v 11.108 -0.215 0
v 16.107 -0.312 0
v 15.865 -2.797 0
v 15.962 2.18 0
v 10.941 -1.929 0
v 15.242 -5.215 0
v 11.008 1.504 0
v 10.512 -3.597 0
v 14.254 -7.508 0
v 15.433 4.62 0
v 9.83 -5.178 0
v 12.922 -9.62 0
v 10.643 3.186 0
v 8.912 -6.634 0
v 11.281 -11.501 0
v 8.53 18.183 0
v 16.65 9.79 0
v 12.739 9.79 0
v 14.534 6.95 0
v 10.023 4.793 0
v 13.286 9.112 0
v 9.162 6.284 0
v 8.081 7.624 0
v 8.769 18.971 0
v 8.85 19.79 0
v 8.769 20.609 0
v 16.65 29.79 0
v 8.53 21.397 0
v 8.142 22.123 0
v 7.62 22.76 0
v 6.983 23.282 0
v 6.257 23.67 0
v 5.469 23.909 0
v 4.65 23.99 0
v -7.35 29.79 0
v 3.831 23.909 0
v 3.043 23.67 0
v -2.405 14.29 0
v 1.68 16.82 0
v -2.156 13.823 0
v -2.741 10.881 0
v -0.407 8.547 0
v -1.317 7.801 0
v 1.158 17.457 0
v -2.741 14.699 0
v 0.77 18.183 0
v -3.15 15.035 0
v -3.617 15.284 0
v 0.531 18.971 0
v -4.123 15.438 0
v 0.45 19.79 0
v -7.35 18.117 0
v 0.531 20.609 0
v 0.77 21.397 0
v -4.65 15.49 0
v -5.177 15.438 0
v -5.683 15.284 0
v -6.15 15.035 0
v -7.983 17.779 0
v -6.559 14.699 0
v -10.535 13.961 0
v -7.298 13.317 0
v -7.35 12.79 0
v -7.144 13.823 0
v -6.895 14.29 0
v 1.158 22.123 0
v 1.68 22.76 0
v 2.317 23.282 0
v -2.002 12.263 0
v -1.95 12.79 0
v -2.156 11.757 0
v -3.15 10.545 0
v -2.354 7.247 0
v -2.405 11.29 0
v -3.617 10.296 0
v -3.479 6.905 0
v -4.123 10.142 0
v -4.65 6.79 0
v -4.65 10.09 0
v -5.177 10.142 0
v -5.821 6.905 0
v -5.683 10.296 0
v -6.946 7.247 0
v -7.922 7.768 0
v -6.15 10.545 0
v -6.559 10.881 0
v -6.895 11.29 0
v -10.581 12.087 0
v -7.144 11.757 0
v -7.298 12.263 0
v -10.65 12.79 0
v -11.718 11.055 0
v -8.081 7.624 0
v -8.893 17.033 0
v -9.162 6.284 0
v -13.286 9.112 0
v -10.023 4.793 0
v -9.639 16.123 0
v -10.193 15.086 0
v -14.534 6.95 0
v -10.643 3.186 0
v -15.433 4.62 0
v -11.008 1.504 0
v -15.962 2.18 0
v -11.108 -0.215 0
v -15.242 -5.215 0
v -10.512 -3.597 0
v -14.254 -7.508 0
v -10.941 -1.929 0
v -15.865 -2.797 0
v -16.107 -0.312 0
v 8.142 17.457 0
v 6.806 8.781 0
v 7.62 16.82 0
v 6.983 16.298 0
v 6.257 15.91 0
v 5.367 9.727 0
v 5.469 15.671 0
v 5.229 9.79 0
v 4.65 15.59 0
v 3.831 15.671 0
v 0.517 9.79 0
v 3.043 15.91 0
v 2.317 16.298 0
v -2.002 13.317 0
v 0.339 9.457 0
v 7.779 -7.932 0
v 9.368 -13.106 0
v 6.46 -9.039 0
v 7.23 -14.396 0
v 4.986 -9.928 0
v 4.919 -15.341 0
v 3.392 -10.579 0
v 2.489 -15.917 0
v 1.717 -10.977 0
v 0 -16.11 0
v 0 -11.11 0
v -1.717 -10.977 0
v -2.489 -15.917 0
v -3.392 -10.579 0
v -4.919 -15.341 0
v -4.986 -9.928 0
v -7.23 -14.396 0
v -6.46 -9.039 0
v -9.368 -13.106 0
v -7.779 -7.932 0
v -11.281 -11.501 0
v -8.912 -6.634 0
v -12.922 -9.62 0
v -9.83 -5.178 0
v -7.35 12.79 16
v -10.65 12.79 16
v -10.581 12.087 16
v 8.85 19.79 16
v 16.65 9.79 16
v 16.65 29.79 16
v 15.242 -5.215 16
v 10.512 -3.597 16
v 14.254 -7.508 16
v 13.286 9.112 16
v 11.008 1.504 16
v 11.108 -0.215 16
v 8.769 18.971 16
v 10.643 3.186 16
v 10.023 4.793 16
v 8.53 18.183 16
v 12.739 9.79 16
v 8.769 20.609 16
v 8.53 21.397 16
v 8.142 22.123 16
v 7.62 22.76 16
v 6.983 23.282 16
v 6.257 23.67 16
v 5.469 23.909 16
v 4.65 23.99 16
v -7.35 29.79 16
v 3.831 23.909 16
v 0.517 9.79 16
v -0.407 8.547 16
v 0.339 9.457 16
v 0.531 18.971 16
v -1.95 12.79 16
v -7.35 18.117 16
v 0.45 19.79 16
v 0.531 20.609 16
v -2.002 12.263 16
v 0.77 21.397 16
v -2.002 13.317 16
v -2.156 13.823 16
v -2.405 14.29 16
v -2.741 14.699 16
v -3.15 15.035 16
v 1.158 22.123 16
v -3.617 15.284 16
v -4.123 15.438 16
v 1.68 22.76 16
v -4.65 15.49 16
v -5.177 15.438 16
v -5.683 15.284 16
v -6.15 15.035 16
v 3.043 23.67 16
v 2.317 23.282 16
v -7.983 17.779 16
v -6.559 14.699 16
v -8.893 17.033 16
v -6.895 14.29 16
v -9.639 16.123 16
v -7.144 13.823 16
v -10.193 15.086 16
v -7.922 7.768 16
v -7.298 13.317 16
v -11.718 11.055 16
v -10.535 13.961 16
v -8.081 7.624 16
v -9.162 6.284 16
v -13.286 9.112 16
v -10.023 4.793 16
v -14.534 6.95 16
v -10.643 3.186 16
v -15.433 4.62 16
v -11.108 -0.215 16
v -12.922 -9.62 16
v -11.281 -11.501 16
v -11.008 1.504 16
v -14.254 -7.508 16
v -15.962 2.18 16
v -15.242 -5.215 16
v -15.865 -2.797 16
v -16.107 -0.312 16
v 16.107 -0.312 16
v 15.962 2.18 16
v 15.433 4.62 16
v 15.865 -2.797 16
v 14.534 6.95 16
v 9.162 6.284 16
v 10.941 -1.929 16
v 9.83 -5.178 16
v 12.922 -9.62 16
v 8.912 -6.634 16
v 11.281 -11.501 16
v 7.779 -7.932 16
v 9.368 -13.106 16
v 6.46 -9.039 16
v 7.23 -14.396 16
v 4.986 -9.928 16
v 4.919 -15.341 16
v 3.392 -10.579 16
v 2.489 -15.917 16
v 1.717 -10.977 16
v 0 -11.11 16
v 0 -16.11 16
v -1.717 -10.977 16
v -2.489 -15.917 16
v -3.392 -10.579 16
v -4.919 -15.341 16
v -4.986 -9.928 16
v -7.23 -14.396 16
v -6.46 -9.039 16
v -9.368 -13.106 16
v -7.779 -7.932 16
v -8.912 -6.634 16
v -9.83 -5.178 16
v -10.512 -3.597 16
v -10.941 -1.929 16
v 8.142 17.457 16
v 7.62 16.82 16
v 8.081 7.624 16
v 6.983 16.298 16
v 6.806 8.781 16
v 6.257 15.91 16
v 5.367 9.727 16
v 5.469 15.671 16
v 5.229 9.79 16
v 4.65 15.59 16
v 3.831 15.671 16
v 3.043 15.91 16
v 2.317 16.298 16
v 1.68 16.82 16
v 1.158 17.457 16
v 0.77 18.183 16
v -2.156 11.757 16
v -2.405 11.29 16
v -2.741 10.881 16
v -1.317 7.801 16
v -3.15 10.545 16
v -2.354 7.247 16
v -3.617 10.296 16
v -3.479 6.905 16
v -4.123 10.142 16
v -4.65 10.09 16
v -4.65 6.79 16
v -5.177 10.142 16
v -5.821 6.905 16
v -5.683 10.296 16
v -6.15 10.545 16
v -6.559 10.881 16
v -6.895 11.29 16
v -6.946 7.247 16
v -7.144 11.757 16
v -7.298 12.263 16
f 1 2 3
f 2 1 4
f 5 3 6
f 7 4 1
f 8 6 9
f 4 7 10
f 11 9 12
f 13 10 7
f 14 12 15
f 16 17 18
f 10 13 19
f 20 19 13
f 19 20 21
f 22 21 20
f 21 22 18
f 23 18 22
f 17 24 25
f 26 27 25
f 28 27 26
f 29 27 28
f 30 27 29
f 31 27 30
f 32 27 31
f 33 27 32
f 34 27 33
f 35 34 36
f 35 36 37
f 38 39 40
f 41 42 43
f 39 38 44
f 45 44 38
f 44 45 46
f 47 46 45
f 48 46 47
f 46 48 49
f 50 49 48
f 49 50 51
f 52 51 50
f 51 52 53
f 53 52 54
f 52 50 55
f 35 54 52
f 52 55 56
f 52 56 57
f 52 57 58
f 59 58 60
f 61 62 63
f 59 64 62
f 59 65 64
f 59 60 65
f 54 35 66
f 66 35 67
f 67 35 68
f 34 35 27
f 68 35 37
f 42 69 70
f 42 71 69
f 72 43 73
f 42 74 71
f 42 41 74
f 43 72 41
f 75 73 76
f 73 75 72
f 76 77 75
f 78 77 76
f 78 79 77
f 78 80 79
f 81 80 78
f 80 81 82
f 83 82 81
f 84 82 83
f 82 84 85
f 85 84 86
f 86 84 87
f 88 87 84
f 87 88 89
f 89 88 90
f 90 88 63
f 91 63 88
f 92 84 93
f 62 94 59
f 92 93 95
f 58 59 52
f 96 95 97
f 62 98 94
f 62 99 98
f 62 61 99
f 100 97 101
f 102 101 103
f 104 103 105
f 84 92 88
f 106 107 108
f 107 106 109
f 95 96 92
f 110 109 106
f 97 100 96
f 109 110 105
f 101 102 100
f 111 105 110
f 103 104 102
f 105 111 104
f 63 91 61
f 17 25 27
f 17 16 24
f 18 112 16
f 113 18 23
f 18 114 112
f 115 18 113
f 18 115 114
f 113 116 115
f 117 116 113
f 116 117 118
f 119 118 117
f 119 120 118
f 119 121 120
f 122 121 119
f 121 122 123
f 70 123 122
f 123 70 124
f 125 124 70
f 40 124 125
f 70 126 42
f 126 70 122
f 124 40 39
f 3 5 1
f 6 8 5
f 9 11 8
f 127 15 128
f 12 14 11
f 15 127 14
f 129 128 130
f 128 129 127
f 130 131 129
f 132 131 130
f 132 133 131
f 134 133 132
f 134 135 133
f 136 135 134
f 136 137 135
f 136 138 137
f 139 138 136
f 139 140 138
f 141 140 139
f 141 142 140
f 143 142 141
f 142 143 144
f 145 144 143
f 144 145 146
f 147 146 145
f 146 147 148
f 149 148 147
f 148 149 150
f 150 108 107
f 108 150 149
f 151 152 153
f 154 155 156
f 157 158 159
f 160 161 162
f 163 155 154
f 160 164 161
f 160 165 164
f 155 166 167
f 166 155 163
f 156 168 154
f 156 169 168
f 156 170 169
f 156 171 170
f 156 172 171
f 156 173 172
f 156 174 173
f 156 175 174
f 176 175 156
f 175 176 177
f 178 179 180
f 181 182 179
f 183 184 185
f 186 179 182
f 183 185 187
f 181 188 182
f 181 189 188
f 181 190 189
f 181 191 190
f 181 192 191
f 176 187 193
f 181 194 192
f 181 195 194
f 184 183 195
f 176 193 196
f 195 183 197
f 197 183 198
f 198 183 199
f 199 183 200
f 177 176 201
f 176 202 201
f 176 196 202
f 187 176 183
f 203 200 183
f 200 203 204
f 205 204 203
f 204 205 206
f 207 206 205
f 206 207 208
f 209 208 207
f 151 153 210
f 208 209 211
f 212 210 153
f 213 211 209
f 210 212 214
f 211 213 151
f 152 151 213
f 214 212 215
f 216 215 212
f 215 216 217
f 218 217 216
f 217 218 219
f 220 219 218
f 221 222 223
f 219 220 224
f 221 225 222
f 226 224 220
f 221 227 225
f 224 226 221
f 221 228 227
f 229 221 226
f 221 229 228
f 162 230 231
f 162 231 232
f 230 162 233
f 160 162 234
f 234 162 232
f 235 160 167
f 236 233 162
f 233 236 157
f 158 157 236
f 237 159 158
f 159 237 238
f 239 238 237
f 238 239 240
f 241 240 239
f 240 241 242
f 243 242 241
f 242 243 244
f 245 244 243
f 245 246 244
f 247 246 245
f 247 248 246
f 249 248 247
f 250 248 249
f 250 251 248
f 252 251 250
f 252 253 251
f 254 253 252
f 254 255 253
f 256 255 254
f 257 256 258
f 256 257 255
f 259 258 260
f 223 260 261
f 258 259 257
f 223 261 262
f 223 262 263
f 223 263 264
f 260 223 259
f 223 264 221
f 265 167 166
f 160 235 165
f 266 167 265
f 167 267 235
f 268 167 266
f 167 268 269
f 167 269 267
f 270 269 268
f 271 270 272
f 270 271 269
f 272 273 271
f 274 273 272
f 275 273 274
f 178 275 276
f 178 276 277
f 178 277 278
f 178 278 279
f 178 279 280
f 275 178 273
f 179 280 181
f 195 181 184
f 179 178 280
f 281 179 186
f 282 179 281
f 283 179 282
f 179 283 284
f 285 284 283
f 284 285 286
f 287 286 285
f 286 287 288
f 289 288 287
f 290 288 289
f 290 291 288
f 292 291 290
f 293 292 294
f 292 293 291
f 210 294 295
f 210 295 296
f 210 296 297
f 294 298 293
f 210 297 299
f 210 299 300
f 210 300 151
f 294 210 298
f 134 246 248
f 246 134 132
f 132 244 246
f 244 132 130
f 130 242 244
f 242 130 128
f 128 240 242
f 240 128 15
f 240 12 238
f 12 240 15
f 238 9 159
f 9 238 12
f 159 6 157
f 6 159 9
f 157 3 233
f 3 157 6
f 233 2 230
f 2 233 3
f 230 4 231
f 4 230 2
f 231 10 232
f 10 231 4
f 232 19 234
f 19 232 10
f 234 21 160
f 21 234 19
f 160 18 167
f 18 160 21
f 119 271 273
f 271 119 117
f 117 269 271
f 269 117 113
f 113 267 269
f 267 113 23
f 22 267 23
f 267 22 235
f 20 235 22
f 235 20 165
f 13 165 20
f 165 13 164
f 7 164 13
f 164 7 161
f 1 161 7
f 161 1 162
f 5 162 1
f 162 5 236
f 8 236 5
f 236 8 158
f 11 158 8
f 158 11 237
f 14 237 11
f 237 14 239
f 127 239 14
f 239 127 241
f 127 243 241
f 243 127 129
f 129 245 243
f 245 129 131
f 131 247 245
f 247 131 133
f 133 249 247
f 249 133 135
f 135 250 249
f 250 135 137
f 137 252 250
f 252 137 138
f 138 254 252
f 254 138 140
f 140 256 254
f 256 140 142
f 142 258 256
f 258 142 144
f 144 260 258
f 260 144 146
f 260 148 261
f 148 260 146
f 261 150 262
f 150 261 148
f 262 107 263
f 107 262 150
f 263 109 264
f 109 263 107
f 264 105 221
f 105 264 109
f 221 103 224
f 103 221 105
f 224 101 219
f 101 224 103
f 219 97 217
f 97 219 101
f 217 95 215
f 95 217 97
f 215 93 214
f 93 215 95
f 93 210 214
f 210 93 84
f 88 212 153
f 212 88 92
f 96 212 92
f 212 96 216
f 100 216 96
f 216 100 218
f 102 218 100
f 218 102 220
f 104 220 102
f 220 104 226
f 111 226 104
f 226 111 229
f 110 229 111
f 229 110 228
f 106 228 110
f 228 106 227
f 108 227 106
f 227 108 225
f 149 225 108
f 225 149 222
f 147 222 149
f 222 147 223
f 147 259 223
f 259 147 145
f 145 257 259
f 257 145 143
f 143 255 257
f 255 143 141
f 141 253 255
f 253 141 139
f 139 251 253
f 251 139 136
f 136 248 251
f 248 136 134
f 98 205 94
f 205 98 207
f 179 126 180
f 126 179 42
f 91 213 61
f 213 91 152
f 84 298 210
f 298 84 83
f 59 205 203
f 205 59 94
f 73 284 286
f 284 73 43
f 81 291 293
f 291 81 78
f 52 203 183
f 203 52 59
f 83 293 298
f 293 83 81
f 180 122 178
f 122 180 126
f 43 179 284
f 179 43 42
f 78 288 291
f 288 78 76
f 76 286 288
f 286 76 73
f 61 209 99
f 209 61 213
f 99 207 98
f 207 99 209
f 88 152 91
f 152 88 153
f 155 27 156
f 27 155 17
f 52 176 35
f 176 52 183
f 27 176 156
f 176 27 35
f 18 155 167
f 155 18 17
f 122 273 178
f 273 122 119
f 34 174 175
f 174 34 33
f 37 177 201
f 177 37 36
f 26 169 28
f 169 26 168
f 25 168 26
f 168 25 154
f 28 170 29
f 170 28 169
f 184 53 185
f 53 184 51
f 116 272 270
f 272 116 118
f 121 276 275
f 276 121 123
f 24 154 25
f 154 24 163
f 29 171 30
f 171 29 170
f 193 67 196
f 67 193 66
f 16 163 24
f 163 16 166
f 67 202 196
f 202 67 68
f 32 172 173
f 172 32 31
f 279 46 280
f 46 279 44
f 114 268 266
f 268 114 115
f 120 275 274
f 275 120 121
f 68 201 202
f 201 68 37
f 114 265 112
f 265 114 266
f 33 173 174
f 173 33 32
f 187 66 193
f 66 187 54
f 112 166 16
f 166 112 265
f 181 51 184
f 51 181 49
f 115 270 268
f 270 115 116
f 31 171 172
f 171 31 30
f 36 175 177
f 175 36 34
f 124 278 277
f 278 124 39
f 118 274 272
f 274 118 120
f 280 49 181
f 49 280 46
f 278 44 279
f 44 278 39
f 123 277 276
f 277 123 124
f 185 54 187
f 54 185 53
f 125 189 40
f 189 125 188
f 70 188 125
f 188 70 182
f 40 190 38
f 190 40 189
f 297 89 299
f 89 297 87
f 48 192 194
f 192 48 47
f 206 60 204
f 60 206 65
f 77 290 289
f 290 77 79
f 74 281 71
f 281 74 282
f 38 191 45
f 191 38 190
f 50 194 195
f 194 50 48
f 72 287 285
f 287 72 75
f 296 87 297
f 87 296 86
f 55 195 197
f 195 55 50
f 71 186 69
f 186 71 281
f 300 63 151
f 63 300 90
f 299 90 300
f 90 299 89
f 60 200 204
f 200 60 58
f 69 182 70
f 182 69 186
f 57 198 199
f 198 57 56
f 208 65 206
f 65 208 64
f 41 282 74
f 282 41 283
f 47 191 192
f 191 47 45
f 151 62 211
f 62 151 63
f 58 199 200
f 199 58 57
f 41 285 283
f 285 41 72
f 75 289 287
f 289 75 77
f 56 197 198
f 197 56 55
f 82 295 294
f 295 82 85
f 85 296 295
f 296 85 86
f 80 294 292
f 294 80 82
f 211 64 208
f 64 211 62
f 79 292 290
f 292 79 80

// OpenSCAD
$fn = 32;

// ----------------------------------------------------------------------
// Pipe clamp: 32.22 mm ring, 5 mm wall, 16 mm wide
// ----------------------------------------------------------------------

// --- parameters (mm) ---
outer_r = 16.11;          // clamp outside radius
inner_r = 11.11;          // pipe bore radius
band = 5;                 // band thickness
clamp_w = 16;             // clamp width
opening = 40;             // opening angle between the ends
lug_w = 24;               // lug width
lug_len = 20;             // lug length
bolt_d = 8.4;             // bolt hole
knuckle_d = 12;           // hinge knuckle diameter
pin_d = 5.4;              // hinge pin hole

clamp_profile = [[-5.51, 15.138], [-7.783, 14.105], [-9.869, 12.733], [-11.718, 11.055], [-13.286, 9.112], [-14.534, 6.95], [-15.433, 4.62], [-15.962, 2.18], [-16.107, -0.312], [-15.865, -2.797], [-15.242, -5.215], [-14.254, -7.508], [-12.922, -9.62], [-11.281, -11.501], [-9.368, -13.106], [-7.23, -14.396], [-4.919, -15.341], [-2.489, -15.917], [0, -16.11], [2.489, -15.917], [4.919, -15.341], [7.23, -14.396], [9.368, -13.106], [11.281, -11.501], [12.922, -9.62], [14.254, -7.508], [15.242, -5.215], [15.865, -2.797], [16.107, -0.312], [15.962, 2.18], [15.433, 4.62], [14.534, 6.95], [13.286, 9.112], [11.718, 11.055], [9.869, 12.733], [7.783, 14.105], [5.51, 15.138], [3.8, 10.44], [5.367, 9.727], [6.806, 8.781], [8.081, 7.624], [9.162, 6.284], [10.023, 4.793], [10.643, 3.186], [11.008, 1.504], [11.108, -0.215], [10.941, -1.929], [10.512, -3.597], [9.83, -5.178], [8.912, -6.634], [7.779, -7.932], [6.46, -9.039], [4.986, -9.928], [3.392, -10.579], [1.717, -10.977], [0, -11.11], [-1.717, -10.977], [-3.392, -10.579], [-4.986, -9.928], [-6.46, -9.039], [-7.779, -7.932], [-8.912, -6.634], [-9.83, -5.178], [-10.512, -3.597], [-10.941, -1.929], [-11.108, -0.215], [-11.008, 1.504], [-10.643, 3.186], [-10.023, 4.793], [-9.162, 6.284], [-8.081, 7.624], [-6.806, 8.781], [-5.367, 9.727], [-3.8, 10.44]];

difference() {
  union() {
    linear_extrude(height = clamp_w) polygon(clamp_profile);
    /* hinge knuckle, sunk 2 mm into the band end */
    translate([-4.65, 12.79, 0]) cylinder(h = clamp_w, d = knuckle_d);
    /* bolt lug on the other end */
    translate([-7.35, 9.79, 0]) cube([lug_w, 20, clamp_w]);
  }
  translate([4.65, 19.79, -2.5]) cylinder(h = clamp_w + 5, d = bolt_d);
  translate([-4.65, 12.79, -2.5]) cylinder(h = clamp_w + 5, d = pin_d);
}
